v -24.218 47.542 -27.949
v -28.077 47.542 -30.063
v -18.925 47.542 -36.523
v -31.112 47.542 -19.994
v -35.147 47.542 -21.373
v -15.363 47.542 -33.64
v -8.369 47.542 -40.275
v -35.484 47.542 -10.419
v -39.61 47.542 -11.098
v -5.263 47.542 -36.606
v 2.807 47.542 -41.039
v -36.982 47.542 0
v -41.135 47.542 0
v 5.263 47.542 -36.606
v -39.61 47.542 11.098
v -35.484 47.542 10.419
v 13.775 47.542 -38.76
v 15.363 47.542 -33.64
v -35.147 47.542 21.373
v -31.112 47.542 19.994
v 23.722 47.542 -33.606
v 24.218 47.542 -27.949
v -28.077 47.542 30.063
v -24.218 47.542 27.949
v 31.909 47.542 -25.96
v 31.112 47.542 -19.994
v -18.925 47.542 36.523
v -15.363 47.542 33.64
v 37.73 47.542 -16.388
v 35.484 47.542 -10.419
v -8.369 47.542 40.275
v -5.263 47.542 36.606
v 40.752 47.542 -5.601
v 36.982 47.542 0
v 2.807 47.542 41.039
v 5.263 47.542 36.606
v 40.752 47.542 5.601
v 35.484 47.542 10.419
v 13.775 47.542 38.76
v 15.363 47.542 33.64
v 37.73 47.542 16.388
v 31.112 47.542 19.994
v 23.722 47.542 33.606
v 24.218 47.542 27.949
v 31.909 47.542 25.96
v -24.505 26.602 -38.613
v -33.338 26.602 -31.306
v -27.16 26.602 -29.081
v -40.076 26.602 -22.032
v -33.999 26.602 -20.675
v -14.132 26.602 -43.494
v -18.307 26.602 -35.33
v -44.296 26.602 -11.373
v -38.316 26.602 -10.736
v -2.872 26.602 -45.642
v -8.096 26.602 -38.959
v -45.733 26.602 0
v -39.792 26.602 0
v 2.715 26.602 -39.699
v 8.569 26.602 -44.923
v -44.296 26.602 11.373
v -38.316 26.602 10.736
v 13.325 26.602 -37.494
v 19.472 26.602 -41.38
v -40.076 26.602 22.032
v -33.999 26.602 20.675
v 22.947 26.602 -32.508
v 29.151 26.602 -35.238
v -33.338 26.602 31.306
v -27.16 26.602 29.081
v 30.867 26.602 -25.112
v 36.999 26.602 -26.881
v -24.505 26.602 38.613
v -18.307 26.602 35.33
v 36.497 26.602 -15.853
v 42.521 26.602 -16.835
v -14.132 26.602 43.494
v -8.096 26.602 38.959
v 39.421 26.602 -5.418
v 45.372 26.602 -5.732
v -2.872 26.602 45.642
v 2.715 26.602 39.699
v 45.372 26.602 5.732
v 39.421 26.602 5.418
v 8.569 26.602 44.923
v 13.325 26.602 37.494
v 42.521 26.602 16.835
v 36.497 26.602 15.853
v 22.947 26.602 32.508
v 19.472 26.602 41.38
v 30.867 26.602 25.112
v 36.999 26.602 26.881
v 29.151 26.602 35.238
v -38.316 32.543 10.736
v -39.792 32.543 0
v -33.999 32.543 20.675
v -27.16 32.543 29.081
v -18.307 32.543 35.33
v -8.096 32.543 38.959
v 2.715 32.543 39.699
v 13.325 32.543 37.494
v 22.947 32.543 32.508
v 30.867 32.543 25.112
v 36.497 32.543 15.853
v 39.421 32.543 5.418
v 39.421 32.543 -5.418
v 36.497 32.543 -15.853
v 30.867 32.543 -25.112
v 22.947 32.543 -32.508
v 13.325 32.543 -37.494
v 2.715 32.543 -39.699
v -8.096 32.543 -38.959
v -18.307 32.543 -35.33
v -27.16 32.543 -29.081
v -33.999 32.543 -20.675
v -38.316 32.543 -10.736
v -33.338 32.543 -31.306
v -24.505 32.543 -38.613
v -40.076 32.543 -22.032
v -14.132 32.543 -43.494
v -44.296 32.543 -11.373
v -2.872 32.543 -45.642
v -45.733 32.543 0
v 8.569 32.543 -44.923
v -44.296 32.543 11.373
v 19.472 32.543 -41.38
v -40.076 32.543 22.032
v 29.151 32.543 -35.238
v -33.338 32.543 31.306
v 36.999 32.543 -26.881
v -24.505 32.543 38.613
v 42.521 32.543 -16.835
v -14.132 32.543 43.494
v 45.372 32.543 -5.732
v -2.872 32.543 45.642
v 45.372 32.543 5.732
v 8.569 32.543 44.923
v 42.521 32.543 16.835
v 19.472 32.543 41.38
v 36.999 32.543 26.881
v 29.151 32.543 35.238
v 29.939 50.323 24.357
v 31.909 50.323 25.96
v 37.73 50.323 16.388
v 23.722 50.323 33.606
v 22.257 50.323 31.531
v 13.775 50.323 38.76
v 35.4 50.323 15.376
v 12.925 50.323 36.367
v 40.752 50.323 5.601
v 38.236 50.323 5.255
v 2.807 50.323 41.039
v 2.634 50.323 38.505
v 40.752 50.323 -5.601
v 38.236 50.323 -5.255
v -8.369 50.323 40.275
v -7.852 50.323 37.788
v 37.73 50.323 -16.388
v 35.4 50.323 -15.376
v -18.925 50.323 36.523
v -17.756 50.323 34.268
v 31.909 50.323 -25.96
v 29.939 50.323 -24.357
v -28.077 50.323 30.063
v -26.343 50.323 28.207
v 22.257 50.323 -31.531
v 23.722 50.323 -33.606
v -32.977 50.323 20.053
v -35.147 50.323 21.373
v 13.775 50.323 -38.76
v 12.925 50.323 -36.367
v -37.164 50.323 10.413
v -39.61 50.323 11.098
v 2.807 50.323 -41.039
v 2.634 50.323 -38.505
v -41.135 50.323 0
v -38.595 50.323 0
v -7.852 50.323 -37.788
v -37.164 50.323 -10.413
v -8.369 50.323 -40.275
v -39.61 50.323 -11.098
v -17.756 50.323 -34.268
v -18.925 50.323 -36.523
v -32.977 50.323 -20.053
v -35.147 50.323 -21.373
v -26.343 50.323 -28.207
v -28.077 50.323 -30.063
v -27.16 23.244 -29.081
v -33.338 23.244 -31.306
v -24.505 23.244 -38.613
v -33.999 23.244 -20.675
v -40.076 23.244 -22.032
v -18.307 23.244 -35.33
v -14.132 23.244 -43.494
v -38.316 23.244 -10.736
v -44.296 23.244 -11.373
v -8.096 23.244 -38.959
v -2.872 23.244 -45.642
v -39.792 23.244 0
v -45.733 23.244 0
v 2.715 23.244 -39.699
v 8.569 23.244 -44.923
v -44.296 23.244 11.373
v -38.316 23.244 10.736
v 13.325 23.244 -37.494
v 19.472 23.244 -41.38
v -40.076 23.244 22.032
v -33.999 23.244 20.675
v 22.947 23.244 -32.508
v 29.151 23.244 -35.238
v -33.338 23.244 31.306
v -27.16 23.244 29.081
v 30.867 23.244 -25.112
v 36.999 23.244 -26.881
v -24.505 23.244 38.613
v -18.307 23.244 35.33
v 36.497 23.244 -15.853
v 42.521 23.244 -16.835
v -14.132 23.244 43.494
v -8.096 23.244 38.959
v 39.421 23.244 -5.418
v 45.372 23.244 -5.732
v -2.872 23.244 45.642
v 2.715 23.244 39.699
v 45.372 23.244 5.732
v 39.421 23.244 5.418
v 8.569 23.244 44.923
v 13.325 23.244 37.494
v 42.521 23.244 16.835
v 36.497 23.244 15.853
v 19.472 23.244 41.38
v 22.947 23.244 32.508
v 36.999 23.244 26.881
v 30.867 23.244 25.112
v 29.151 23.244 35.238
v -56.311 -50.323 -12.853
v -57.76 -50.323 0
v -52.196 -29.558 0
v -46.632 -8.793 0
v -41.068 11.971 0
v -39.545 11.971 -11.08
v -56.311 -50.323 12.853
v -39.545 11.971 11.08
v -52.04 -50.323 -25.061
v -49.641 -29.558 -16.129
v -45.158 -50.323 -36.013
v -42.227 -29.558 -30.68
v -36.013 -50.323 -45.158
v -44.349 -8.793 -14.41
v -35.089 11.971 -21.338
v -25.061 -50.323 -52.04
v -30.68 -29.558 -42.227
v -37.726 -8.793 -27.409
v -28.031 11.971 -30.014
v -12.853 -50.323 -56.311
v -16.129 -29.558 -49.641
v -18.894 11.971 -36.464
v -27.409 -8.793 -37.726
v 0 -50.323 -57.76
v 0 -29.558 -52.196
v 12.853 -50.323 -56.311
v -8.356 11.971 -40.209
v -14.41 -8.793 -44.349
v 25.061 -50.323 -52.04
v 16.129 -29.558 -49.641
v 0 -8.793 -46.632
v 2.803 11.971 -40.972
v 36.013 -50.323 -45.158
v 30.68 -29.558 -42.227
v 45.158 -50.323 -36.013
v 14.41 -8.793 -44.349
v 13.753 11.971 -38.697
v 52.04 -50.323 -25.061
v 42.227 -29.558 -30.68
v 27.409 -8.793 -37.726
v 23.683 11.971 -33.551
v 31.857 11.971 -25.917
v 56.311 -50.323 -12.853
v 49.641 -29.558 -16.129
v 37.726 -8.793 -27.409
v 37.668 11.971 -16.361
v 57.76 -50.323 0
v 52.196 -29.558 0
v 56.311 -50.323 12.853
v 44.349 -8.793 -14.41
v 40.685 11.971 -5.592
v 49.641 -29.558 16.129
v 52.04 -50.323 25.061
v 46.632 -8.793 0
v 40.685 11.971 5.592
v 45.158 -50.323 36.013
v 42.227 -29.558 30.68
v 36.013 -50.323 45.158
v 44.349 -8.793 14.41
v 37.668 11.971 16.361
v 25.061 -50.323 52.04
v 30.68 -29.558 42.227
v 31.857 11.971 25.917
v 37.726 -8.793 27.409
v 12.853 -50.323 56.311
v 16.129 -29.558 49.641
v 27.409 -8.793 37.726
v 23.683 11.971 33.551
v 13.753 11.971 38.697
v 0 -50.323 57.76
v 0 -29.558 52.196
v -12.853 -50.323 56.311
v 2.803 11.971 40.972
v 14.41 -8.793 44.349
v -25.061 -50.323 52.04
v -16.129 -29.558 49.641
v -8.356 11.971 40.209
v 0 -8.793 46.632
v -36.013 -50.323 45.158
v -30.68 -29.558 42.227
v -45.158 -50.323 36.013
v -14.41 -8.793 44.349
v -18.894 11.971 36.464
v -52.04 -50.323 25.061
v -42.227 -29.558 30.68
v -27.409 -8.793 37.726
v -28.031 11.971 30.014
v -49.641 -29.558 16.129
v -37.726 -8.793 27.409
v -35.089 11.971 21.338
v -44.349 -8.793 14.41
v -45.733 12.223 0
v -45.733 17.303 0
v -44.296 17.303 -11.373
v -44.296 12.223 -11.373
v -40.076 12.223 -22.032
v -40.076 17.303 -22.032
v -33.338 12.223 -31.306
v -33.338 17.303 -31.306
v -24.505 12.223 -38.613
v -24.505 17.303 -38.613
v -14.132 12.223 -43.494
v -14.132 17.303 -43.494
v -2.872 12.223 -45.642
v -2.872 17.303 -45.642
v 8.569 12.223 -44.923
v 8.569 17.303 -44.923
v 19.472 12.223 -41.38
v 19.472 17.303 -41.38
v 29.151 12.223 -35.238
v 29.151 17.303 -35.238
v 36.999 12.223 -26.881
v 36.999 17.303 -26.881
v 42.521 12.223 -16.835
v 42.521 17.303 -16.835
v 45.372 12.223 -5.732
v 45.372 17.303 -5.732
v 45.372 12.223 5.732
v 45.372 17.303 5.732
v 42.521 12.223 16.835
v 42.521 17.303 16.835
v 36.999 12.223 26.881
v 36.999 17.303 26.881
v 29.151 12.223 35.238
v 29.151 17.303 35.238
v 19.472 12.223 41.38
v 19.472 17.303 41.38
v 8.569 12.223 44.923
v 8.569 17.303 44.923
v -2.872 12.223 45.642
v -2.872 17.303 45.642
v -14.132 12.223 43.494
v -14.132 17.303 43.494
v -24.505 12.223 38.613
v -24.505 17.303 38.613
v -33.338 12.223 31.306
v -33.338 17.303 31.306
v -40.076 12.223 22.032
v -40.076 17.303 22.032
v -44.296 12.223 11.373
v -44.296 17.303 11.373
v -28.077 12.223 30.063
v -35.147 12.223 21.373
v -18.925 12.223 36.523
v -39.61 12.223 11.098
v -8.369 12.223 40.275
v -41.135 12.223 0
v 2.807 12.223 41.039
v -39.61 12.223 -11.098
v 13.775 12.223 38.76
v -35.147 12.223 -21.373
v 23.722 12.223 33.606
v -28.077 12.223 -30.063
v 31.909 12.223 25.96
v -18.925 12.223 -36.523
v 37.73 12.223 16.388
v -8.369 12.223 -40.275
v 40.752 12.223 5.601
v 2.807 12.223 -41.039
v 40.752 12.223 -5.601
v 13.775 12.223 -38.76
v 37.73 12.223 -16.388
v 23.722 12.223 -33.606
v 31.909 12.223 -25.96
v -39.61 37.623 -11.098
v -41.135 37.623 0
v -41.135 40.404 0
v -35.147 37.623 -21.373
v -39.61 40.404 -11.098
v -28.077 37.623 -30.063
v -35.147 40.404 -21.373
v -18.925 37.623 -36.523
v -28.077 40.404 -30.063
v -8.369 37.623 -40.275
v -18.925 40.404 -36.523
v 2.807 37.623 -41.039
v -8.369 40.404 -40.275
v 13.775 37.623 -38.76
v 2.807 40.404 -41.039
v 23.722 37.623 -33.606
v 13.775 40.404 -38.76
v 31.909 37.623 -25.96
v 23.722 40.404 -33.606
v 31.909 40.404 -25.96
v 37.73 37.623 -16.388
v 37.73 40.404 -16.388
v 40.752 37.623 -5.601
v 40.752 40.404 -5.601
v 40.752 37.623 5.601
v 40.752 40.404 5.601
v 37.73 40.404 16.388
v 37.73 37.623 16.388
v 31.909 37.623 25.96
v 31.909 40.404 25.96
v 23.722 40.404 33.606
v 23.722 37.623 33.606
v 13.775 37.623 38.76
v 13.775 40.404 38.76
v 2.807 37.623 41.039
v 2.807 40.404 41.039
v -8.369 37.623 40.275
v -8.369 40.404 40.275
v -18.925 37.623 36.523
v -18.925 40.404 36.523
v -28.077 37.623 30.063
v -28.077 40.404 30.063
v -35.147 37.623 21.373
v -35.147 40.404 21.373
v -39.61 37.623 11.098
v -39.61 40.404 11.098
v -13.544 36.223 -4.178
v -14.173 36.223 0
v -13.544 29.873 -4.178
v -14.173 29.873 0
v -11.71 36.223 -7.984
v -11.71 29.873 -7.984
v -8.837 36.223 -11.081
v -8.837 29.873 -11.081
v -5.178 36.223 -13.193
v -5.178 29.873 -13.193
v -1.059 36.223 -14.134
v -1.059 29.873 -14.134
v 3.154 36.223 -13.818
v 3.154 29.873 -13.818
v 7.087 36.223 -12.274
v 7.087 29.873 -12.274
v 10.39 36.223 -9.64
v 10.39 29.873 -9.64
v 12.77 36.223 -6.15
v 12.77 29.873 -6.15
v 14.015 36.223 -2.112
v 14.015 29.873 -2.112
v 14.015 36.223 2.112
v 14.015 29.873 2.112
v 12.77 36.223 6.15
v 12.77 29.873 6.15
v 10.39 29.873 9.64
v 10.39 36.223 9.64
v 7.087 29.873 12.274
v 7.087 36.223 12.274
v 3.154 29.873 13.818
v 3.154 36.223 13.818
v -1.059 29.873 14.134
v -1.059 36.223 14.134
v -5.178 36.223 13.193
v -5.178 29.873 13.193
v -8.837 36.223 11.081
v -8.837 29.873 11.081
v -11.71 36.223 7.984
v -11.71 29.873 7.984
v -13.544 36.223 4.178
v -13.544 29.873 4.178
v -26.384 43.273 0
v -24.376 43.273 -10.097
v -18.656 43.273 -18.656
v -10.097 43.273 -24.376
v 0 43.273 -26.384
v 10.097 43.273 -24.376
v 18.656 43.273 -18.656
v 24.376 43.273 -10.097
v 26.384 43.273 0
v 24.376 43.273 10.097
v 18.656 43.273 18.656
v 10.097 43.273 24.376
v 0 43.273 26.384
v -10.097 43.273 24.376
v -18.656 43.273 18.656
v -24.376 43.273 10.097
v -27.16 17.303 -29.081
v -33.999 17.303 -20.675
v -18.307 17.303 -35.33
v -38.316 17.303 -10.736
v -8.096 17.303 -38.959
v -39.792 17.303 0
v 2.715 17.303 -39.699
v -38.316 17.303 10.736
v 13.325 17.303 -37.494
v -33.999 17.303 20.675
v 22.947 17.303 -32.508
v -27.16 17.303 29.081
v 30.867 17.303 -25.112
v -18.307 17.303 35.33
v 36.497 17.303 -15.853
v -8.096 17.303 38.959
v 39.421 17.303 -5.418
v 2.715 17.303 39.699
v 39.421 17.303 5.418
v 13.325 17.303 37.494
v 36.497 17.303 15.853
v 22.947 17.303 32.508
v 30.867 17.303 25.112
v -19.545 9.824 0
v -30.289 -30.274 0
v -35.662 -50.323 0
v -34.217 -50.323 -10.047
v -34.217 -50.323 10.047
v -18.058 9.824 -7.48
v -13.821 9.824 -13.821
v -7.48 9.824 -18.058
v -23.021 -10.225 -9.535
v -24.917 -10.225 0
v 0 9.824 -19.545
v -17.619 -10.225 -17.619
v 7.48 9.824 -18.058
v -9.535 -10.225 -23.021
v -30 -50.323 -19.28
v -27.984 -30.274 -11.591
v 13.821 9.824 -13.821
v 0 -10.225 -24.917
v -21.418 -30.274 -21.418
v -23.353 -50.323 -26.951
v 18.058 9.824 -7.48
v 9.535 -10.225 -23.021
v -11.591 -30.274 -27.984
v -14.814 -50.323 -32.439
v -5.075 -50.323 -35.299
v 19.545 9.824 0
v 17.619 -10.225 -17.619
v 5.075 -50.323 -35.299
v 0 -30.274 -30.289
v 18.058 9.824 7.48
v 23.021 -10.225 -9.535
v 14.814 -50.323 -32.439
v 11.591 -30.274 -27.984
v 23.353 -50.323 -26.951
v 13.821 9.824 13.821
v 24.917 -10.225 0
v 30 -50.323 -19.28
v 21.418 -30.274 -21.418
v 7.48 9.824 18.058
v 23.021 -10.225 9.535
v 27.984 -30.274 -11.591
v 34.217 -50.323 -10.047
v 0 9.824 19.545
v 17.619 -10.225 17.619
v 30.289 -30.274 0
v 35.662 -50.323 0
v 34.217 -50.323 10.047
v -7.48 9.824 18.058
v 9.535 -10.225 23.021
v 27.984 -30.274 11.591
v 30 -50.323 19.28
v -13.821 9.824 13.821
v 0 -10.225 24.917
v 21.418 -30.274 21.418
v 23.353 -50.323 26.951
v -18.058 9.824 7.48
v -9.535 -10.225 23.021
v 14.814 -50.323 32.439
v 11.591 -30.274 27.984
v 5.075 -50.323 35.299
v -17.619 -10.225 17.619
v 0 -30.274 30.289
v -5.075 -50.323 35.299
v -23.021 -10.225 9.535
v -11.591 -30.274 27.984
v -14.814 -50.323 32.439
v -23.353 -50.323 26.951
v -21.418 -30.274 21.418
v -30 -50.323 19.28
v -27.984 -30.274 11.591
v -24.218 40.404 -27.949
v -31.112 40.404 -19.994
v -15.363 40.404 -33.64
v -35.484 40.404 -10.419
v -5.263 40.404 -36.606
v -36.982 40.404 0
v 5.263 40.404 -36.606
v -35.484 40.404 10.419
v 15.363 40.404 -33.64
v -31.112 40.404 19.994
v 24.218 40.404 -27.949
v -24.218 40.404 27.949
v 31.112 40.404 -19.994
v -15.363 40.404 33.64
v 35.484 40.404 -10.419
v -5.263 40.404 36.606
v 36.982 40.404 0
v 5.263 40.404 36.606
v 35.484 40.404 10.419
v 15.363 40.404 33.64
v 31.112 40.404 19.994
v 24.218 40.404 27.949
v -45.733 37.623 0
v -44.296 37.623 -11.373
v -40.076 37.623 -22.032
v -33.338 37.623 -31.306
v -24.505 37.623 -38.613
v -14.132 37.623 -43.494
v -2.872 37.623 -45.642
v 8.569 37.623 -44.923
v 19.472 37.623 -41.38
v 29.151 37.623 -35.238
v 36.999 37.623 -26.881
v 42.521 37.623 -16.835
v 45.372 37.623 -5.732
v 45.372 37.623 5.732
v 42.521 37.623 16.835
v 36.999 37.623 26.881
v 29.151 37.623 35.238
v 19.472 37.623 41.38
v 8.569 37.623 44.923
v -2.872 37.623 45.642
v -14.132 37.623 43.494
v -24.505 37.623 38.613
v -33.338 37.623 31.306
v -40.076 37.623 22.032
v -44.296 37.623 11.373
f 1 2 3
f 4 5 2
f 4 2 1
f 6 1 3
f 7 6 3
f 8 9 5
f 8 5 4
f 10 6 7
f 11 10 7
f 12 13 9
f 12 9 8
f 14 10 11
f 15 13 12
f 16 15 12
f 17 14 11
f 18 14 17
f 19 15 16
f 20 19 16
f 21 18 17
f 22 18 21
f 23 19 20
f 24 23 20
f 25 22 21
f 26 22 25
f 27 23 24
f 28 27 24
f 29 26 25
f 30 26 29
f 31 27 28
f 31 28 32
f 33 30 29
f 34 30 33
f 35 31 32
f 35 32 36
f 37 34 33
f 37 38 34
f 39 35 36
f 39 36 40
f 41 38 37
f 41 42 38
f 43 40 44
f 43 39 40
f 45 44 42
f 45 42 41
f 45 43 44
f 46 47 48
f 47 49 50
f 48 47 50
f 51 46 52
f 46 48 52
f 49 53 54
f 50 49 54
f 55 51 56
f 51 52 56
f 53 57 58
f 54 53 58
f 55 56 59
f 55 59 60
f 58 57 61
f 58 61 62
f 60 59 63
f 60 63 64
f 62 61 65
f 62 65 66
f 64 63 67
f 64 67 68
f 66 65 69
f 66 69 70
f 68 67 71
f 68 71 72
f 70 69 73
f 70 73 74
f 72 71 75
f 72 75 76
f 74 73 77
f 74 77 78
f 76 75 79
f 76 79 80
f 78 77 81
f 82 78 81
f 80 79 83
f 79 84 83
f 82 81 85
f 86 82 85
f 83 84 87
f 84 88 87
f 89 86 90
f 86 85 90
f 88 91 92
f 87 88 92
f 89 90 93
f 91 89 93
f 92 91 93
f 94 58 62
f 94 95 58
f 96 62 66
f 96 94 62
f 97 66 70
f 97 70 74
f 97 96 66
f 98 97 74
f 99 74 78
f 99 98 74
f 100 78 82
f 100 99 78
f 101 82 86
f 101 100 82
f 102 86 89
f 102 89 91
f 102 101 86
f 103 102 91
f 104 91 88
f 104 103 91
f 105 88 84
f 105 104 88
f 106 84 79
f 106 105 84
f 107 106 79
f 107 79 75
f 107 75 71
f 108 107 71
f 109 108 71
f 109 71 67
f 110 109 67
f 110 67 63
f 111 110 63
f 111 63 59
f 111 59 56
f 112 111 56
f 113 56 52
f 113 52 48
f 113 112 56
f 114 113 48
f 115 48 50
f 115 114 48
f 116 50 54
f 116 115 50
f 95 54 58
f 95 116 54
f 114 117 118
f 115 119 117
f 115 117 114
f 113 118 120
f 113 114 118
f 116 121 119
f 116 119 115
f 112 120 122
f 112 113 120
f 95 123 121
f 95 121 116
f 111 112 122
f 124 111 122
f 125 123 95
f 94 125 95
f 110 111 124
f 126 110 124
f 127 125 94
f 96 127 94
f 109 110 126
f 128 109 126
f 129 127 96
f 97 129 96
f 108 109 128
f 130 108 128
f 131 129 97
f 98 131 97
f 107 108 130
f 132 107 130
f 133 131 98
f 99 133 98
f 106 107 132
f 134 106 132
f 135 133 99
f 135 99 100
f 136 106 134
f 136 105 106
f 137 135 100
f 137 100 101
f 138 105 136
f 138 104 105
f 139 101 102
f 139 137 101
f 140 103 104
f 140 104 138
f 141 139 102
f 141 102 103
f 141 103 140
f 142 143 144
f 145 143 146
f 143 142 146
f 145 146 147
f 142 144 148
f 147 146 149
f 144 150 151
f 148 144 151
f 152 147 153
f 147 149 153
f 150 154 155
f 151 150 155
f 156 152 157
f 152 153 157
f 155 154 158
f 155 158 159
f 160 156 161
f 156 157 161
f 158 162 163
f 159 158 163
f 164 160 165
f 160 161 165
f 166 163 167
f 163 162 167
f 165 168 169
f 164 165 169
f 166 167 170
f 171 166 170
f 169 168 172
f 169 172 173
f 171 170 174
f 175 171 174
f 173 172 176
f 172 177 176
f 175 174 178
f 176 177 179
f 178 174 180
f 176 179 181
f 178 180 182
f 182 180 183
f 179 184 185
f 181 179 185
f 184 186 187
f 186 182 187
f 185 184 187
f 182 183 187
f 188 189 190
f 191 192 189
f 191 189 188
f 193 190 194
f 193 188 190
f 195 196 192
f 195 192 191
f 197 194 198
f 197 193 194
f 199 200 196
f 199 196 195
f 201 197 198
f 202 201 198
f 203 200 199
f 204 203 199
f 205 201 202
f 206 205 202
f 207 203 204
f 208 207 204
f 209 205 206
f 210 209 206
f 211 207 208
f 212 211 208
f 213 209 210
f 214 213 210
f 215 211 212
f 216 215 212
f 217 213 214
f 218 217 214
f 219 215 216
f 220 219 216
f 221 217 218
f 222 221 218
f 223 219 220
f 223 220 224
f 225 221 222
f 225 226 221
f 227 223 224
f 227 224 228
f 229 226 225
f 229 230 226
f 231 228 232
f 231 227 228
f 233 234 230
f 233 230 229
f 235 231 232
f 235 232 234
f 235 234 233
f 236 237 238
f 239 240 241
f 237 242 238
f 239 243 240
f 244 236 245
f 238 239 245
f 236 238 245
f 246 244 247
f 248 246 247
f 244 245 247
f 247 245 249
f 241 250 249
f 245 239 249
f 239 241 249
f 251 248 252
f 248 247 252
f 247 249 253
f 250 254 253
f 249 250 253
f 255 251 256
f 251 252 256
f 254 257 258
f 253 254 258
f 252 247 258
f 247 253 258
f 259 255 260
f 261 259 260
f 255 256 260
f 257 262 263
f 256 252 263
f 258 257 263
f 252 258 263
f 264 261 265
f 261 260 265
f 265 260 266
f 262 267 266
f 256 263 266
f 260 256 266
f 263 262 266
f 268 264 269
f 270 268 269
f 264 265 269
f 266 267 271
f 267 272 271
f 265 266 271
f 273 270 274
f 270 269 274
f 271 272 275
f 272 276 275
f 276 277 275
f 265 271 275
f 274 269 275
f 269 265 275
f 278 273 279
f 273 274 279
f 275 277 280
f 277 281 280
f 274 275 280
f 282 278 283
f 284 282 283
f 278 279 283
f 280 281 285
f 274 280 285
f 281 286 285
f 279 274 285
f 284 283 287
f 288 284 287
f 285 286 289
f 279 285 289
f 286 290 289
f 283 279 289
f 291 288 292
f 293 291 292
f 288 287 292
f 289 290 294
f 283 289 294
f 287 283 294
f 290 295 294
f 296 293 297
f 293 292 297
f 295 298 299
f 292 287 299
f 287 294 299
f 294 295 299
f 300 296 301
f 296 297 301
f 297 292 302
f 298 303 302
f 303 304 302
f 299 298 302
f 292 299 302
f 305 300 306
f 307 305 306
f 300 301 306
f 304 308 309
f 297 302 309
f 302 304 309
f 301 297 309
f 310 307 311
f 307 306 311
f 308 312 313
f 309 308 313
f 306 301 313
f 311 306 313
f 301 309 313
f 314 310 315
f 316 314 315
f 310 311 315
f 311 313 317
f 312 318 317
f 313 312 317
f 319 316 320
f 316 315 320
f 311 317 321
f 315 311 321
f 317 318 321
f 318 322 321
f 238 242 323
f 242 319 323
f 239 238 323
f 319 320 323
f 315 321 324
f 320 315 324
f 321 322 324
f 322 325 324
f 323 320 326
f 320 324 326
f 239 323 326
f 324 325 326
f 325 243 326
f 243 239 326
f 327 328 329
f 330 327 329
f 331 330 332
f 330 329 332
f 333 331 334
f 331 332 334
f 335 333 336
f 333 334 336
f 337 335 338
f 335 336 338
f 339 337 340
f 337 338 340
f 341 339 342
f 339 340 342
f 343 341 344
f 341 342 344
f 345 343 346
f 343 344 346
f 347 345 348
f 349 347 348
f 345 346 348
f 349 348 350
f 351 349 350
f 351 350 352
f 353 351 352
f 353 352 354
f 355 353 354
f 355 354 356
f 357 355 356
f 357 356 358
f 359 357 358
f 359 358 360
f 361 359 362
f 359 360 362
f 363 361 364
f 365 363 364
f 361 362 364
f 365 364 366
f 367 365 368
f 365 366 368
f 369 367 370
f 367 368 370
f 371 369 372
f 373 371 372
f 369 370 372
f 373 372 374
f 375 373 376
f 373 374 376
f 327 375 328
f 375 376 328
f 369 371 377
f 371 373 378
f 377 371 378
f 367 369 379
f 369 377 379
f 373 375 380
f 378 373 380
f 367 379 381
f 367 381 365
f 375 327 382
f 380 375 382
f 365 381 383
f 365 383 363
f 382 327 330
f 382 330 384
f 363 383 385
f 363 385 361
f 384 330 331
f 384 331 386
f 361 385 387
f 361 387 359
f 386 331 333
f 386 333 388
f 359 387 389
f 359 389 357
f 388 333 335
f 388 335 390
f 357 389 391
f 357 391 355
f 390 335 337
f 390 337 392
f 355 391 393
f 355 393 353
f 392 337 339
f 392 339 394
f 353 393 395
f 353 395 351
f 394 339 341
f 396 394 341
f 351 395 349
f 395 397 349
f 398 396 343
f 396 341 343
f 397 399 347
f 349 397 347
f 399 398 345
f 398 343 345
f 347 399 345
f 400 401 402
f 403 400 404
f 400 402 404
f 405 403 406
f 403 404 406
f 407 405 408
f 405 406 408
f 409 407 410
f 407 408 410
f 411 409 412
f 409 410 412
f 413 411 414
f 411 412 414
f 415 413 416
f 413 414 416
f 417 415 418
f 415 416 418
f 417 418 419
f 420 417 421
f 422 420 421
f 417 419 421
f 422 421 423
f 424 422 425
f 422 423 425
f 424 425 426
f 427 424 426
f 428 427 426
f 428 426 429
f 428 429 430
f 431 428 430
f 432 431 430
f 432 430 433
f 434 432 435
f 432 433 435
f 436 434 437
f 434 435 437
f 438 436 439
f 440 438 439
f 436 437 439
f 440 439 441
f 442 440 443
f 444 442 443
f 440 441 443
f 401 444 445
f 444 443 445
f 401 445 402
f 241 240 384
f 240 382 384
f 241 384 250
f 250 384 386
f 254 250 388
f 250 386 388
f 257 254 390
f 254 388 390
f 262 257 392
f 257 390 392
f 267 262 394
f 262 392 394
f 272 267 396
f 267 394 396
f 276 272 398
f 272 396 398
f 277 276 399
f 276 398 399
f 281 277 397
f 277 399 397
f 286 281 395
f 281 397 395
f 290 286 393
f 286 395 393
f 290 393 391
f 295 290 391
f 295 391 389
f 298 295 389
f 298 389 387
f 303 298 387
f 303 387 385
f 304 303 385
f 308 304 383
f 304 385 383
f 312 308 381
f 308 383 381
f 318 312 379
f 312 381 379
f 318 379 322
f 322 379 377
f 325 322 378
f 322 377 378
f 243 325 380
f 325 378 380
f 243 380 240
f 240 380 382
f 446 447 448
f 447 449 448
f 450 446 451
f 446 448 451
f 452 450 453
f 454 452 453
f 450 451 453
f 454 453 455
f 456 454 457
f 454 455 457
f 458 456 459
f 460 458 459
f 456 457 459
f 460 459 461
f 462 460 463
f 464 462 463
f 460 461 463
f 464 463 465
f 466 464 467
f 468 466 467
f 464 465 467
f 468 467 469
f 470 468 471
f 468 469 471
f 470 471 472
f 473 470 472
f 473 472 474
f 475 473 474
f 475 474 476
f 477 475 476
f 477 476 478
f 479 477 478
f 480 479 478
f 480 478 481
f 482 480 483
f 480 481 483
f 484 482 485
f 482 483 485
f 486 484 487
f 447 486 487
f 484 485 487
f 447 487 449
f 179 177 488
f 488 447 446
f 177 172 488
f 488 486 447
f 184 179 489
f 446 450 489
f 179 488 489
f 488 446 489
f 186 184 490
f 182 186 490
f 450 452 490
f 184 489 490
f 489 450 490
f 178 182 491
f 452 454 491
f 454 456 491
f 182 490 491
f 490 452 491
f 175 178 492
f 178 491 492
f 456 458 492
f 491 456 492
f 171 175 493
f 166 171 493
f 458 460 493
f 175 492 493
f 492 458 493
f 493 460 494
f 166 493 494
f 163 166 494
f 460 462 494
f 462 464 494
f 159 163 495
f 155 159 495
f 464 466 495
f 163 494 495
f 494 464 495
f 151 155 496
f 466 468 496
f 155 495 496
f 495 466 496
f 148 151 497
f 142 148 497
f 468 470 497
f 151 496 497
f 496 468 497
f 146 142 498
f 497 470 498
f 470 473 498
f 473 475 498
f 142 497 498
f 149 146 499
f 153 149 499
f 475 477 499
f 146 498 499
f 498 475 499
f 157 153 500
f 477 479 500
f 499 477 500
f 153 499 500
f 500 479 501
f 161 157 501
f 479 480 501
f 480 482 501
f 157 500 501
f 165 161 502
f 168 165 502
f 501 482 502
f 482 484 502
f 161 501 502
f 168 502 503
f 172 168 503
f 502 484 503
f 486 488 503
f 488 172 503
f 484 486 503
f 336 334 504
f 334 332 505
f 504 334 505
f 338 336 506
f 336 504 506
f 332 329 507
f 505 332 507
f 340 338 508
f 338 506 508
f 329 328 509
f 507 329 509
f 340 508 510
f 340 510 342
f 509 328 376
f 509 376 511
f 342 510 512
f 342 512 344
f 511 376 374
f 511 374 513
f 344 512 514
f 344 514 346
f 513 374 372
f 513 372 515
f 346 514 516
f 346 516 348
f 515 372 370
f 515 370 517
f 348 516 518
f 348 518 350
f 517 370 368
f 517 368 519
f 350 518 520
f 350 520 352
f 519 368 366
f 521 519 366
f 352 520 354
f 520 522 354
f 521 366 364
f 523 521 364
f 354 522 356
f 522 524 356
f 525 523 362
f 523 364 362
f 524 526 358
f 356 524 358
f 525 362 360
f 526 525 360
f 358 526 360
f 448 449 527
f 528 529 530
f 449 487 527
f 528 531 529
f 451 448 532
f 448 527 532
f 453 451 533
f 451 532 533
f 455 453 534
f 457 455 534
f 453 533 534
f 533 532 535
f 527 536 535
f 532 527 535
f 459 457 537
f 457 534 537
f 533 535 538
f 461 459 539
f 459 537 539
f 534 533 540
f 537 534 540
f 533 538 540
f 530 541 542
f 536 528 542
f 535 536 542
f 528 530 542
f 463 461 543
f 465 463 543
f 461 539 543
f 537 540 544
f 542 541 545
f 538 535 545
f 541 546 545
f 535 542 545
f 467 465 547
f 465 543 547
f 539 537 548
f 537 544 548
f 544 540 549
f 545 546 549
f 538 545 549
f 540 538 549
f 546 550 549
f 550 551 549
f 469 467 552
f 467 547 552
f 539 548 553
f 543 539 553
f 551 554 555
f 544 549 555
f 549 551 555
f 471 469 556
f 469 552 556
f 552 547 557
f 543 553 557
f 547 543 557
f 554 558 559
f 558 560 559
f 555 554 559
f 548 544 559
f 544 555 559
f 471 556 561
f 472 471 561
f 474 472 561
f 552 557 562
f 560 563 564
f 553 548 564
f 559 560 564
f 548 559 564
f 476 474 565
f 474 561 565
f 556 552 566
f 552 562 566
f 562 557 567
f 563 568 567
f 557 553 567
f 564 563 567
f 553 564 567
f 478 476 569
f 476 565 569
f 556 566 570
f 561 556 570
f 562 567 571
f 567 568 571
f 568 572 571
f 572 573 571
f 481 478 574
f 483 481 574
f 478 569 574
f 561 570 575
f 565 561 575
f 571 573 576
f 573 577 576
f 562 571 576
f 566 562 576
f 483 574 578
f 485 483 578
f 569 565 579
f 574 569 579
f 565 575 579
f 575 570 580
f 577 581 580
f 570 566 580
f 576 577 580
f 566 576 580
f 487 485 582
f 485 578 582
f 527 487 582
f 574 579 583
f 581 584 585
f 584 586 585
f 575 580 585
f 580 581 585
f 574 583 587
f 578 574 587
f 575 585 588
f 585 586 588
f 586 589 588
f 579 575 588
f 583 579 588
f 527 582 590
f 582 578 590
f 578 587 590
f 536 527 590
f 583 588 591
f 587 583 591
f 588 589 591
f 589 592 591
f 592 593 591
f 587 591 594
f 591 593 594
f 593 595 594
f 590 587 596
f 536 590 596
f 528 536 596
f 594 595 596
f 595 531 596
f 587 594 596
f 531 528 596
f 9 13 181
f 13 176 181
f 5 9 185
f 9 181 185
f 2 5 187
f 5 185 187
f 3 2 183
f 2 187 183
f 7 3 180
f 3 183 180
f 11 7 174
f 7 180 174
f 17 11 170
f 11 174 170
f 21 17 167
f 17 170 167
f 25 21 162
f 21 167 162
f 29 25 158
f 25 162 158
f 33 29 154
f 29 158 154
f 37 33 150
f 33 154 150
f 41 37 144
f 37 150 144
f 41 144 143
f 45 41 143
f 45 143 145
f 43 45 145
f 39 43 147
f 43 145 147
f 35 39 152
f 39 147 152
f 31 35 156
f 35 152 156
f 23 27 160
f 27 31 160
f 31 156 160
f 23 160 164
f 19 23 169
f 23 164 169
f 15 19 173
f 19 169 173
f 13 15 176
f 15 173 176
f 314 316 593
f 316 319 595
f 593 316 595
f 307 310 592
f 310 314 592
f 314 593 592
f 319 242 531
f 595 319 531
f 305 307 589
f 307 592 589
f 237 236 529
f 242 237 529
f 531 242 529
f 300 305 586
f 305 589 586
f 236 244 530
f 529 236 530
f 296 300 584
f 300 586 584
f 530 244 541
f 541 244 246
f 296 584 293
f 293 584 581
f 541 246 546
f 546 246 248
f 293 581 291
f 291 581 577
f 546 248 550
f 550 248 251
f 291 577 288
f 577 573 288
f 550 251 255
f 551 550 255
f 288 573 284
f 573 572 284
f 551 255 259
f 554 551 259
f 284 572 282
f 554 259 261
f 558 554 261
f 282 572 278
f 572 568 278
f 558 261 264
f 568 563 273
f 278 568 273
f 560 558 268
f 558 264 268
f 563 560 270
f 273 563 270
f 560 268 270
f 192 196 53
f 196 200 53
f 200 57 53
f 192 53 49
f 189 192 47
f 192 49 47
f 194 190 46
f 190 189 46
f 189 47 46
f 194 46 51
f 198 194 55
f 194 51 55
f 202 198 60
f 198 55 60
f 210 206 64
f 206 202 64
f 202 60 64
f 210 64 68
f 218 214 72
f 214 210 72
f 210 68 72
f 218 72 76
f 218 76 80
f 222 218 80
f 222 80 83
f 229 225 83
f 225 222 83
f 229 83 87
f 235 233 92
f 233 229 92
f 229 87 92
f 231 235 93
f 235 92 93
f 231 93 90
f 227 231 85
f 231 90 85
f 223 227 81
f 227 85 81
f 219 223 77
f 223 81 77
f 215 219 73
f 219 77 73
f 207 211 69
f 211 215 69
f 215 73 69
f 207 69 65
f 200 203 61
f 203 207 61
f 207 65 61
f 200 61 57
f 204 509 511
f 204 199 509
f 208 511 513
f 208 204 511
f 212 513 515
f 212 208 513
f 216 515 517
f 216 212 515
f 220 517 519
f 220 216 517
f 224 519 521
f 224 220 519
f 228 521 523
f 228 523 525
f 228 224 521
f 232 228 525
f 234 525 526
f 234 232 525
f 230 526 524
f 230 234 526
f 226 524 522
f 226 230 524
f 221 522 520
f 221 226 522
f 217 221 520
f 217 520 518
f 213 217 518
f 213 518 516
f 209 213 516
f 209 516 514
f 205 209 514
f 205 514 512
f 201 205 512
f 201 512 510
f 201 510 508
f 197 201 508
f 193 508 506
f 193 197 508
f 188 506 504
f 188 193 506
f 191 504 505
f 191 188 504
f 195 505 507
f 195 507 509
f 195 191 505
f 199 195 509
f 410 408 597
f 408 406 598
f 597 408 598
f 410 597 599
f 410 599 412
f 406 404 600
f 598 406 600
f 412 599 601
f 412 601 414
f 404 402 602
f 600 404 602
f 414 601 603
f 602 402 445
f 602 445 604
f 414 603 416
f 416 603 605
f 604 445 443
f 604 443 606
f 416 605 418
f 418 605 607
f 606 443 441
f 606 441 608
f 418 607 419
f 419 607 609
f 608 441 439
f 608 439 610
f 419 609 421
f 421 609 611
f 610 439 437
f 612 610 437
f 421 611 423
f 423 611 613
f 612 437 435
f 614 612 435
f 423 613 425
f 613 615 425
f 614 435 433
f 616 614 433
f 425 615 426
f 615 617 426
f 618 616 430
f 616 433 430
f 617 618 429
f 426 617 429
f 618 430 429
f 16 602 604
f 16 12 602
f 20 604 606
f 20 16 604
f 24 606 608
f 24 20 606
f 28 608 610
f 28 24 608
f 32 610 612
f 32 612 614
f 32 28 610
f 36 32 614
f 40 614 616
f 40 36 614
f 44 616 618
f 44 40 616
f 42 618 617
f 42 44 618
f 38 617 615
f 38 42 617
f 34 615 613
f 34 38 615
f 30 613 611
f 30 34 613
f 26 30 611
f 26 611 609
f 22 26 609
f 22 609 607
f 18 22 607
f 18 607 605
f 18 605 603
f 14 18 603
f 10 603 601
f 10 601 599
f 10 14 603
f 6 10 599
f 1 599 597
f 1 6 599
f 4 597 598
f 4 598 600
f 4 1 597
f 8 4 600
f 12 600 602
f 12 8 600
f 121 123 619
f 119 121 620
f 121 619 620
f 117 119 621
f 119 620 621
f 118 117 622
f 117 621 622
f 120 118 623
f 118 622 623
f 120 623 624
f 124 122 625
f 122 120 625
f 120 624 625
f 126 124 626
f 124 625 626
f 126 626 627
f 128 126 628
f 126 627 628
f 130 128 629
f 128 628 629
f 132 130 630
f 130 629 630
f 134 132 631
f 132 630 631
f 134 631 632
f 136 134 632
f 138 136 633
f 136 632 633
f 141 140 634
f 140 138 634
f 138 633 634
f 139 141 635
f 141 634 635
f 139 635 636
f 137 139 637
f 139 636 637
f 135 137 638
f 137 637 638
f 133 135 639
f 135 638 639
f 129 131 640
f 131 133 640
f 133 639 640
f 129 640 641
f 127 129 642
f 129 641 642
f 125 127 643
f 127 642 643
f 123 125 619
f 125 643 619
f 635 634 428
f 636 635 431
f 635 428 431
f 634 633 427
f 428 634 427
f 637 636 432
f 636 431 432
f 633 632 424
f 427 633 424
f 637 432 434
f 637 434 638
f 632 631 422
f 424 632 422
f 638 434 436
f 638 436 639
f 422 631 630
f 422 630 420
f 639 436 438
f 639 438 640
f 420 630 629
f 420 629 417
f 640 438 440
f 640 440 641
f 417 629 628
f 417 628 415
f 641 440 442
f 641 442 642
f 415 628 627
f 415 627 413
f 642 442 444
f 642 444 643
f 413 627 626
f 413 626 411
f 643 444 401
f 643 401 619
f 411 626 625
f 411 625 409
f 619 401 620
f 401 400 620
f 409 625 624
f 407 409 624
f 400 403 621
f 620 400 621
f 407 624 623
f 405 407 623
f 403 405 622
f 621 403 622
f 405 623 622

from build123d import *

# Parameters (mm, degrees)
SKETCH2_W   = 4.1529
SKETCH2_H   = 7.1374
SKETCH2_W_2 = 5.941173797
SKETCH2_H_2 = 5.941173796
SKETCH2_H_3 = 5.941173797


with BuildPart() as part:
    # Sketch1 → Revolve1 (revolve)
    with BuildSketch(Plane.XY, mode=Mode.PRIVATE) as revolve1_sk:
        Polygon((41.1353, 50.322953291), (38.5953, 50.322953291), (14.1732, 36.222847282), (14.1732, 29.872847282), (35.6616, -50.322953291), (57.7596, -50.322953291), (41.067887421, 11.97136612), (41.1353, 12.222953291), (45.7327, 12.222953291), (45.7327, 37.622953291), (41.1353, 37.622953291), align=None)
    revolve(revolve1_sk.sketch.rotate(Axis((0, 50.322953291, 0), (0, -1, 0)), 180), axis=Axis((0, 50.322953291, 0), (0, -1, 0)))

    # Sketch2 → Cut-Revolve1 (revolve, cut)
    with BuildSketch(Plane.XY, mode=Mode.PRIVATE) as cut_revolve1_sk:
        with Locations((39.05885, 43.972953291)):
            Rectangle(SKETCH2_W, SKETCH2_H)
        with Locations((42.762113102, 29.572366393)):
            Rectangle(SKETCH2_W_2, SKETCH2_H_2)
        with Locations((42.762113102, 20.27354019)):
            Rectangle(SKETCH2_W_2, SKETCH2_H_3)
    revolve(cut_revolve1_sk.sketch.rotate(Axis((0, 50.322953291, 0), (0, 1, 0)), 180), axis=Axis((0, 50.322953291, 0), (0, 1, 0)), mode=Mode.SUBTRACT)


solid = part.part
